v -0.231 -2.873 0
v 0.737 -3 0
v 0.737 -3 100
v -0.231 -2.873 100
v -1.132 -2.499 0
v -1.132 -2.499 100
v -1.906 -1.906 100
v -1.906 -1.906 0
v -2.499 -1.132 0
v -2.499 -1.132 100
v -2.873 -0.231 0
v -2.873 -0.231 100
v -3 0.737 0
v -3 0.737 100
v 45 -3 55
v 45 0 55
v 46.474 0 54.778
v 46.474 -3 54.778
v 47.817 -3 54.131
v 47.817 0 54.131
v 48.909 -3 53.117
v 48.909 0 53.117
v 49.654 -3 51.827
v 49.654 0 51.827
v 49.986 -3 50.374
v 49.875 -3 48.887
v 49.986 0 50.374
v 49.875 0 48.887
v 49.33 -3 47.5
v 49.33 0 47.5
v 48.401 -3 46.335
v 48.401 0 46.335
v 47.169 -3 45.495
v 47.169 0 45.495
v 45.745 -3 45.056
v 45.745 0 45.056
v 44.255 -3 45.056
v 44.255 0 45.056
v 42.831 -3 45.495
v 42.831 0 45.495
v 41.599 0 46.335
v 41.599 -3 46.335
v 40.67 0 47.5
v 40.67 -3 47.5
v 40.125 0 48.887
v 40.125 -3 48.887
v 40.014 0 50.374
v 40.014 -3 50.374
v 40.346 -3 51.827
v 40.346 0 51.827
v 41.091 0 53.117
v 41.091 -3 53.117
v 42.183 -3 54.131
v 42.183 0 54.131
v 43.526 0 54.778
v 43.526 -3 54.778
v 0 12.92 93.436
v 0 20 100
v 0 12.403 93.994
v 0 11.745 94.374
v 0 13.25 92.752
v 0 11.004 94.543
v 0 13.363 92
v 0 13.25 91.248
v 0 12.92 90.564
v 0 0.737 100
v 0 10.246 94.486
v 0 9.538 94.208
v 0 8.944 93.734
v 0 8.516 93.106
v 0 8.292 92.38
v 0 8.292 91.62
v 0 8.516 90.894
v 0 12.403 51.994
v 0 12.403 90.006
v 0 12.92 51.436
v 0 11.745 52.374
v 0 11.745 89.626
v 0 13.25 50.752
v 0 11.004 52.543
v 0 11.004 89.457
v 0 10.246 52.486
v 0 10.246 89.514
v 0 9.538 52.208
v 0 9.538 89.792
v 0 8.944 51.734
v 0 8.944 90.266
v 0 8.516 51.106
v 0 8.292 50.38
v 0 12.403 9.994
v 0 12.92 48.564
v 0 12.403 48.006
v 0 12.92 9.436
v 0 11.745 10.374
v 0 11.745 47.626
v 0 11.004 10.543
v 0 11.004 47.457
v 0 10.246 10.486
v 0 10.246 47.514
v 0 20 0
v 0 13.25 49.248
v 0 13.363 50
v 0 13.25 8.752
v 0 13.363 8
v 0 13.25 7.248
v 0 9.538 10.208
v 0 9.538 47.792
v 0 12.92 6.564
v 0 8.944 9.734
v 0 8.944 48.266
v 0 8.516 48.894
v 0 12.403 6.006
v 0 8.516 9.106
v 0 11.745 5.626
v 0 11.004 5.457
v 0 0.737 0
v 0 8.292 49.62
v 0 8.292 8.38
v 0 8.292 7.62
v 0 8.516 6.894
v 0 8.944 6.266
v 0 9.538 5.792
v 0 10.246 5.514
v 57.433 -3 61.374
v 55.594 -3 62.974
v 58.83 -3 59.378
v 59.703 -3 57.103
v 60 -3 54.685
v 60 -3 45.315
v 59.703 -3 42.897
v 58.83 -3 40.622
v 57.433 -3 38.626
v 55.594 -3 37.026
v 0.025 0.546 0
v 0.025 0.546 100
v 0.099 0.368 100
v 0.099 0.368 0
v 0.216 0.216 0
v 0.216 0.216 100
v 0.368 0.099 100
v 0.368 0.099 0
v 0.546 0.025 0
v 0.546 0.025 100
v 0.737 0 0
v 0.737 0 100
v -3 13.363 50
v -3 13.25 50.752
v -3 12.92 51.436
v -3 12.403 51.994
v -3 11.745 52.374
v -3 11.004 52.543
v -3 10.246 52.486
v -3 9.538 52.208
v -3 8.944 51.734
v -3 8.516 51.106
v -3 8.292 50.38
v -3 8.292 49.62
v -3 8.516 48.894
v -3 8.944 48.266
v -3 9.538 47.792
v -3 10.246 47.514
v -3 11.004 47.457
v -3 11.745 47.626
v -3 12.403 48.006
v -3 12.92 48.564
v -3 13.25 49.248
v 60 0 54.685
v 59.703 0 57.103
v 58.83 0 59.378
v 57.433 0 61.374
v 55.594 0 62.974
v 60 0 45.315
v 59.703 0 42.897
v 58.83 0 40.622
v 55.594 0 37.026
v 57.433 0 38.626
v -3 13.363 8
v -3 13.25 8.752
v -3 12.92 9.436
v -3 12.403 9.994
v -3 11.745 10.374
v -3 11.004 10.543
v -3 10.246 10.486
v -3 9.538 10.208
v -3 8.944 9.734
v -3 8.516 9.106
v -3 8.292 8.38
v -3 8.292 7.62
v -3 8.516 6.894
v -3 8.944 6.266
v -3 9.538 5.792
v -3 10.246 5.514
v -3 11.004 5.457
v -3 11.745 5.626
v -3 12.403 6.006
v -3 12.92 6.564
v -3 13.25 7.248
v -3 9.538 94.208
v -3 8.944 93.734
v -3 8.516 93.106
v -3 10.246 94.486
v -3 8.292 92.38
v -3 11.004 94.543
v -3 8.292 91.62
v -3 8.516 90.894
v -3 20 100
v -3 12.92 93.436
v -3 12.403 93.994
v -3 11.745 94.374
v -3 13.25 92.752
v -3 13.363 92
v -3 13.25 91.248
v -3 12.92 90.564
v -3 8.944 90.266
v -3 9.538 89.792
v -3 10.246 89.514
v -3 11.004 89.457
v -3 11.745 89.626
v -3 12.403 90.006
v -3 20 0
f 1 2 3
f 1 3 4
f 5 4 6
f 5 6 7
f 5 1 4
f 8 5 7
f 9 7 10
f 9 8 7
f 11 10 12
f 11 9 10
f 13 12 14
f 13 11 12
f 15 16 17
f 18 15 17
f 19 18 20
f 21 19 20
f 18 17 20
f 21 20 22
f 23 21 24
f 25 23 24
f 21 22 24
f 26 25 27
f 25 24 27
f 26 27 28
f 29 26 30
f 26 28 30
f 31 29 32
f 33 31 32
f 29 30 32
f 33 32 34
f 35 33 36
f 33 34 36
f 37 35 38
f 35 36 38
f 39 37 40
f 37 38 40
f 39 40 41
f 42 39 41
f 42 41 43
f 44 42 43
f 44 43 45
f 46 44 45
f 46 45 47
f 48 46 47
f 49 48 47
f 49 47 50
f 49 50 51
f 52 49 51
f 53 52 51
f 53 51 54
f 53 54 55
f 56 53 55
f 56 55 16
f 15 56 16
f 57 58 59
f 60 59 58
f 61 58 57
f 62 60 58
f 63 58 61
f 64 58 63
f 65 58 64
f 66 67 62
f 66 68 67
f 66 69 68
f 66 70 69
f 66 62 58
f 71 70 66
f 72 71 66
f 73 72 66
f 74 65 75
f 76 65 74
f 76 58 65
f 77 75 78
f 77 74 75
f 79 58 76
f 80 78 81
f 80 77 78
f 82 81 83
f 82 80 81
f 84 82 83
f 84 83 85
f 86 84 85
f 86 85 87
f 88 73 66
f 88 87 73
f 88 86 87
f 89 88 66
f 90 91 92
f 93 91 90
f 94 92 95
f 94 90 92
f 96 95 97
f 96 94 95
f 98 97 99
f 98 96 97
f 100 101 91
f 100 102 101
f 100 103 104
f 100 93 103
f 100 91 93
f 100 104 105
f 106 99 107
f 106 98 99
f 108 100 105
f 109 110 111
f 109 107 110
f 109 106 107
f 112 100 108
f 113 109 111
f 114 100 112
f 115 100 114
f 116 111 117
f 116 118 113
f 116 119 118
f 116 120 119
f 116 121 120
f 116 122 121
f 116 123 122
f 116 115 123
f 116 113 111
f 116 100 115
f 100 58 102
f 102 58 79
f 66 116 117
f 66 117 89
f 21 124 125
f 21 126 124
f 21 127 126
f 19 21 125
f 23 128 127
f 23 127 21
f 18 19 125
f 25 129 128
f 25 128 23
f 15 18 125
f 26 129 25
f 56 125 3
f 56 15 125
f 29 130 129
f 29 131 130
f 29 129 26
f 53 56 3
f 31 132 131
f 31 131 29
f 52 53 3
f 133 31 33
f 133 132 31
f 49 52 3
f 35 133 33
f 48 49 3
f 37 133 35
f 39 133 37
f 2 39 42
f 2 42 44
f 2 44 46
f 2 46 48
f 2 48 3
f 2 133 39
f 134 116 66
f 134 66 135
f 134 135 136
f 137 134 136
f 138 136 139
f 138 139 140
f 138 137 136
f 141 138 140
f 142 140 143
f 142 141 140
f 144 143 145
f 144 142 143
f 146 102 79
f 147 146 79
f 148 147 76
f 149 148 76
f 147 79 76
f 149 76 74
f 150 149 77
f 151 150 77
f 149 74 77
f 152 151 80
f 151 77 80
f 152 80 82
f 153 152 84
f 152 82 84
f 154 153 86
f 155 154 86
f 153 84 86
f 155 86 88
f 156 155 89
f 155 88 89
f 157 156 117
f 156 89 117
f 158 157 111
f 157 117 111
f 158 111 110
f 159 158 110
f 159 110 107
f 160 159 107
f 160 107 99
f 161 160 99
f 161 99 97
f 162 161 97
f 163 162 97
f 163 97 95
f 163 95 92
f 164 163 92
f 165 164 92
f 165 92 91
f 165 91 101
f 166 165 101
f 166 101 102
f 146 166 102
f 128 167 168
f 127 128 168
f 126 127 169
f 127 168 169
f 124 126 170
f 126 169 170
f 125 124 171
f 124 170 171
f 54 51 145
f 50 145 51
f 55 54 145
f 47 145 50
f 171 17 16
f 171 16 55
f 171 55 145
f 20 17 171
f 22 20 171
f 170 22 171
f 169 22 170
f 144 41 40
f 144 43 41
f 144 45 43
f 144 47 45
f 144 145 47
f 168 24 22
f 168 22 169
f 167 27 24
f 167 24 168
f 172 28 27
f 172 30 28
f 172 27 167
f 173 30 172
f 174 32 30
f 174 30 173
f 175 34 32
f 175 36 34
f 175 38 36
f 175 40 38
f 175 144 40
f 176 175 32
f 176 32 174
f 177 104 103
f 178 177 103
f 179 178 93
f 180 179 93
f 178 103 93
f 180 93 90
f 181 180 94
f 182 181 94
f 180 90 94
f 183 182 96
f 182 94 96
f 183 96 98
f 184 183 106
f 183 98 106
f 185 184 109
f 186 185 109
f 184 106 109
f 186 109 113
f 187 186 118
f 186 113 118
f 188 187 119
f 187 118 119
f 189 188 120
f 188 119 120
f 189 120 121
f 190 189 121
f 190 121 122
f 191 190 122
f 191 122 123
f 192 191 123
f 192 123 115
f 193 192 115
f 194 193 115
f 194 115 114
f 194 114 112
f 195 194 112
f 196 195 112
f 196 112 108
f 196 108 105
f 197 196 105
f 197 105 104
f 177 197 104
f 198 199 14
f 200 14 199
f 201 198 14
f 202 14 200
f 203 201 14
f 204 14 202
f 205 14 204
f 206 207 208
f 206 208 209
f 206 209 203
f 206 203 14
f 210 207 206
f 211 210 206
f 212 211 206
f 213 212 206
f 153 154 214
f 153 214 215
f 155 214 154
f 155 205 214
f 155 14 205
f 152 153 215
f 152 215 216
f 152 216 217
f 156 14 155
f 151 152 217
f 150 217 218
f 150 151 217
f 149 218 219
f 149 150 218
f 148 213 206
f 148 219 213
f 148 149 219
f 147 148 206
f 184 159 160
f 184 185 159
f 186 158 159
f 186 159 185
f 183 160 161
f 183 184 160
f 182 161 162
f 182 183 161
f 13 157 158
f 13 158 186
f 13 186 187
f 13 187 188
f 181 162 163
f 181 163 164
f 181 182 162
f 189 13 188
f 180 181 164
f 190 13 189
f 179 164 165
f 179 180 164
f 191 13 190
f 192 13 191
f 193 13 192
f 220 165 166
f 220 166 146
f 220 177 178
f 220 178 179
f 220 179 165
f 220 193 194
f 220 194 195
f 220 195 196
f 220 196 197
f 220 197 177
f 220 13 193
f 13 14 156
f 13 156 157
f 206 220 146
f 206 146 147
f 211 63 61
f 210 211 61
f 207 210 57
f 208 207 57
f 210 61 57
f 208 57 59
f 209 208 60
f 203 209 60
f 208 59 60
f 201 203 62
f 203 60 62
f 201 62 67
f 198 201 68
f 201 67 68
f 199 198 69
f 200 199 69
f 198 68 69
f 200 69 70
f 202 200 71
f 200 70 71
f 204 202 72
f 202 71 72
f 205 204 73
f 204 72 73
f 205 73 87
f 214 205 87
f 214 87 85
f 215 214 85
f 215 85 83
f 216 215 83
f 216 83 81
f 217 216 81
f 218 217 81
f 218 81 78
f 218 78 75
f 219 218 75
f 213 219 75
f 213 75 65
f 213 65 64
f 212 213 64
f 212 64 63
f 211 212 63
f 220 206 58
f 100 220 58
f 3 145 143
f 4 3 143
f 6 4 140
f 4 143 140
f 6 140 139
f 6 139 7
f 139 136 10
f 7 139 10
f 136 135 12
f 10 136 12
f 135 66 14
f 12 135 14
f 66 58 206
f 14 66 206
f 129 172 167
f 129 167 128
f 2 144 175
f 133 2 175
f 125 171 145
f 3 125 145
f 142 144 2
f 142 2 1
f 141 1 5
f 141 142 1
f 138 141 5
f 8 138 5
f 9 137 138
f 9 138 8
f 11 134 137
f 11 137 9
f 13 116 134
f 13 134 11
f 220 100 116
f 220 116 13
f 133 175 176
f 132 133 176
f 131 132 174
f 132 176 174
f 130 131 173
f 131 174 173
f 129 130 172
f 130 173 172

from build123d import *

# Parameters (mm, degrees)
BASE_FLANGE1_DEPTH = 100
CUT_EXTRUDE1_REACH = 120.322
SKETCH6_R          = 2.55
CUT_EXTRUDE2_REACH = 120.322
SKETCH7_R          = 5
CUT_EXTRUDE4_DEPTH = 10


# Sheet-metal steps are written as plain solids
with BuildPart() as part:
    # Sketch1 → Base-Flange1 (new body)
    with BuildSketch(Plane.XY):
        with BuildLine():
            Line((0, 20), (0, 0.7366))
            ThreePointArc((0, 0.7366), (0.215745145, 0.215745145), (0.7366, 0))
            Line((0.7366, 0), (60, 0))
            Line((60, 0), (60, -3))
            Line((60, -3), (0.7366, -3))
            ThreePointArc((0.7366, -3), (-1.905575199, -1.905575199), (-3, 0.7366))
            Line((-3, 0.7366), (-3, 20))
            Line((-3, 20), (0, 20))
        make_face()
    extrude(amount=BASE_FLANGE1_DEPTH)

    # Sketch6 → Cut-Extrude1 (cut, up to next)
    with BuildSketch(Plane(origin=(0, 0, 0), x_dir=(0, 0, -1), z_dir=(1, 0, 0)), mode=Mode.PRIVATE) as cut_extrude1_sk1:
        with Locations(Location((-92, 10.813082186, 0), (0, 0, 90))):
            Circle(SKETCH6_R)
    cut_extrude1_tool1 = extrude(cut_extrude1_sk1.sketch, amount=-CUT_EXTRUDE1_REACH, mode=Mode.PRIVATE) & part.part
    # Sketch6 → Cut-Extrude1 (cut, up to next)
    with BuildSketch(Plane(origin=(0, 0, 0), x_dir=(0, 0, -1), z_dir=(1, 0, 0)), mode=Mode.PRIVATE) as cut_extrude1_sk2:
        with Locations(Location((-8, 10.813082186, 0), (0, 0, 90))):
            Circle(SKETCH6_R)
    cut_extrude1_tool2 = extrude(cut_extrude1_sk2.sketch, amount=-CUT_EXTRUDE1_REACH, mode=Mode.PRIVATE) & part.part
    # Sketch6 → Cut-Extrude1 (cut, up to next)
    with BuildSketch(Plane(origin=(0, 0, 0), x_dir=(0, 0, -1), z_dir=(1, 0, 0)), mode=Mode.PRIVATE) as cut_extrude1_sk3:
        with Locations(Location((-50, 10.813082186, 0), (0, 0, 90))):
            Circle(SKETCH6_R)
    cut_extrude1_tool3 = extrude(cut_extrude1_sk3.sketch, amount=-CUT_EXTRUDE1_REACH, mode=Mode.PRIVATE) & part.part
    add(cut_extrude1_tool1.solids().sort_by_distance((0, 10.813082, 92))[0], mode=Mode.SUBTRACT)
    add(cut_extrude1_tool2.solids().sort_by_distance((0, 10.813082, 8))[0], mode=Mode.SUBTRACT)
    add(cut_extrude1_tool3.solids().sort_by_distance((0, 10.813082, 50))[0], mode=Mode.SUBTRACT)

    # Sketch7 → Cut-Extrude2 (cut, up to next)
    with BuildSketch(Plane(origin=(0, 0, 0), x_dir=(1, 0, 0), z_dir=(0, 1, 0)), mode=Mode.PRIVATE) as cut_extrude2_sk1:
        with Locations(Location((45, -50, 0), (0, 0, 270))):
            Circle(SKETCH7_R)
    cut_extrude2_tool1 = extrude(cut_extrude2_sk1.sketch, amount=-CUT_EXTRUDE2_REACH, mode=Mode.PRIVATE) & part.part
    add(cut_extrude2_tool1.solids().sort_by_distance((45, 0, 50))[0], mode=Mode.SUBTRACT)

    # Sketch8 → Cut-Extrude4 (cut)
    with BuildSketch(Plane(origin=(0, 0, 0), x_dir=(1, 0, 0), z_dir=(0, 1, 0))):
        with BuildLine():
            Line((0.7366, 0), (55.594459994, -37.026468271))
            ThreePointArc((55.594459994, -37.026468271), (58.830192522, -40.621768617), (60, -45.315136281))
            Line((60, -45.315136281), (60, -54.684863719))
            ThreePointArc((60, -54.684863719), (58.830192522, -59.378231383), (55.594459994, -62.973531729))
            Line((55.594459994, -62.973531729), (0.7366, -100))
            Line((0.7366, -100), (64.682636993, -100))
            Line((64.682636993, -100), (64.682636993, 0))
            Line((64.682636993, 0), (0.7366, 0))
        make_face()
    extrude(amount=-CUT_EXTRUDE4_DEPTH, mode=Mode.SUBTRACT)


solid = part.part
